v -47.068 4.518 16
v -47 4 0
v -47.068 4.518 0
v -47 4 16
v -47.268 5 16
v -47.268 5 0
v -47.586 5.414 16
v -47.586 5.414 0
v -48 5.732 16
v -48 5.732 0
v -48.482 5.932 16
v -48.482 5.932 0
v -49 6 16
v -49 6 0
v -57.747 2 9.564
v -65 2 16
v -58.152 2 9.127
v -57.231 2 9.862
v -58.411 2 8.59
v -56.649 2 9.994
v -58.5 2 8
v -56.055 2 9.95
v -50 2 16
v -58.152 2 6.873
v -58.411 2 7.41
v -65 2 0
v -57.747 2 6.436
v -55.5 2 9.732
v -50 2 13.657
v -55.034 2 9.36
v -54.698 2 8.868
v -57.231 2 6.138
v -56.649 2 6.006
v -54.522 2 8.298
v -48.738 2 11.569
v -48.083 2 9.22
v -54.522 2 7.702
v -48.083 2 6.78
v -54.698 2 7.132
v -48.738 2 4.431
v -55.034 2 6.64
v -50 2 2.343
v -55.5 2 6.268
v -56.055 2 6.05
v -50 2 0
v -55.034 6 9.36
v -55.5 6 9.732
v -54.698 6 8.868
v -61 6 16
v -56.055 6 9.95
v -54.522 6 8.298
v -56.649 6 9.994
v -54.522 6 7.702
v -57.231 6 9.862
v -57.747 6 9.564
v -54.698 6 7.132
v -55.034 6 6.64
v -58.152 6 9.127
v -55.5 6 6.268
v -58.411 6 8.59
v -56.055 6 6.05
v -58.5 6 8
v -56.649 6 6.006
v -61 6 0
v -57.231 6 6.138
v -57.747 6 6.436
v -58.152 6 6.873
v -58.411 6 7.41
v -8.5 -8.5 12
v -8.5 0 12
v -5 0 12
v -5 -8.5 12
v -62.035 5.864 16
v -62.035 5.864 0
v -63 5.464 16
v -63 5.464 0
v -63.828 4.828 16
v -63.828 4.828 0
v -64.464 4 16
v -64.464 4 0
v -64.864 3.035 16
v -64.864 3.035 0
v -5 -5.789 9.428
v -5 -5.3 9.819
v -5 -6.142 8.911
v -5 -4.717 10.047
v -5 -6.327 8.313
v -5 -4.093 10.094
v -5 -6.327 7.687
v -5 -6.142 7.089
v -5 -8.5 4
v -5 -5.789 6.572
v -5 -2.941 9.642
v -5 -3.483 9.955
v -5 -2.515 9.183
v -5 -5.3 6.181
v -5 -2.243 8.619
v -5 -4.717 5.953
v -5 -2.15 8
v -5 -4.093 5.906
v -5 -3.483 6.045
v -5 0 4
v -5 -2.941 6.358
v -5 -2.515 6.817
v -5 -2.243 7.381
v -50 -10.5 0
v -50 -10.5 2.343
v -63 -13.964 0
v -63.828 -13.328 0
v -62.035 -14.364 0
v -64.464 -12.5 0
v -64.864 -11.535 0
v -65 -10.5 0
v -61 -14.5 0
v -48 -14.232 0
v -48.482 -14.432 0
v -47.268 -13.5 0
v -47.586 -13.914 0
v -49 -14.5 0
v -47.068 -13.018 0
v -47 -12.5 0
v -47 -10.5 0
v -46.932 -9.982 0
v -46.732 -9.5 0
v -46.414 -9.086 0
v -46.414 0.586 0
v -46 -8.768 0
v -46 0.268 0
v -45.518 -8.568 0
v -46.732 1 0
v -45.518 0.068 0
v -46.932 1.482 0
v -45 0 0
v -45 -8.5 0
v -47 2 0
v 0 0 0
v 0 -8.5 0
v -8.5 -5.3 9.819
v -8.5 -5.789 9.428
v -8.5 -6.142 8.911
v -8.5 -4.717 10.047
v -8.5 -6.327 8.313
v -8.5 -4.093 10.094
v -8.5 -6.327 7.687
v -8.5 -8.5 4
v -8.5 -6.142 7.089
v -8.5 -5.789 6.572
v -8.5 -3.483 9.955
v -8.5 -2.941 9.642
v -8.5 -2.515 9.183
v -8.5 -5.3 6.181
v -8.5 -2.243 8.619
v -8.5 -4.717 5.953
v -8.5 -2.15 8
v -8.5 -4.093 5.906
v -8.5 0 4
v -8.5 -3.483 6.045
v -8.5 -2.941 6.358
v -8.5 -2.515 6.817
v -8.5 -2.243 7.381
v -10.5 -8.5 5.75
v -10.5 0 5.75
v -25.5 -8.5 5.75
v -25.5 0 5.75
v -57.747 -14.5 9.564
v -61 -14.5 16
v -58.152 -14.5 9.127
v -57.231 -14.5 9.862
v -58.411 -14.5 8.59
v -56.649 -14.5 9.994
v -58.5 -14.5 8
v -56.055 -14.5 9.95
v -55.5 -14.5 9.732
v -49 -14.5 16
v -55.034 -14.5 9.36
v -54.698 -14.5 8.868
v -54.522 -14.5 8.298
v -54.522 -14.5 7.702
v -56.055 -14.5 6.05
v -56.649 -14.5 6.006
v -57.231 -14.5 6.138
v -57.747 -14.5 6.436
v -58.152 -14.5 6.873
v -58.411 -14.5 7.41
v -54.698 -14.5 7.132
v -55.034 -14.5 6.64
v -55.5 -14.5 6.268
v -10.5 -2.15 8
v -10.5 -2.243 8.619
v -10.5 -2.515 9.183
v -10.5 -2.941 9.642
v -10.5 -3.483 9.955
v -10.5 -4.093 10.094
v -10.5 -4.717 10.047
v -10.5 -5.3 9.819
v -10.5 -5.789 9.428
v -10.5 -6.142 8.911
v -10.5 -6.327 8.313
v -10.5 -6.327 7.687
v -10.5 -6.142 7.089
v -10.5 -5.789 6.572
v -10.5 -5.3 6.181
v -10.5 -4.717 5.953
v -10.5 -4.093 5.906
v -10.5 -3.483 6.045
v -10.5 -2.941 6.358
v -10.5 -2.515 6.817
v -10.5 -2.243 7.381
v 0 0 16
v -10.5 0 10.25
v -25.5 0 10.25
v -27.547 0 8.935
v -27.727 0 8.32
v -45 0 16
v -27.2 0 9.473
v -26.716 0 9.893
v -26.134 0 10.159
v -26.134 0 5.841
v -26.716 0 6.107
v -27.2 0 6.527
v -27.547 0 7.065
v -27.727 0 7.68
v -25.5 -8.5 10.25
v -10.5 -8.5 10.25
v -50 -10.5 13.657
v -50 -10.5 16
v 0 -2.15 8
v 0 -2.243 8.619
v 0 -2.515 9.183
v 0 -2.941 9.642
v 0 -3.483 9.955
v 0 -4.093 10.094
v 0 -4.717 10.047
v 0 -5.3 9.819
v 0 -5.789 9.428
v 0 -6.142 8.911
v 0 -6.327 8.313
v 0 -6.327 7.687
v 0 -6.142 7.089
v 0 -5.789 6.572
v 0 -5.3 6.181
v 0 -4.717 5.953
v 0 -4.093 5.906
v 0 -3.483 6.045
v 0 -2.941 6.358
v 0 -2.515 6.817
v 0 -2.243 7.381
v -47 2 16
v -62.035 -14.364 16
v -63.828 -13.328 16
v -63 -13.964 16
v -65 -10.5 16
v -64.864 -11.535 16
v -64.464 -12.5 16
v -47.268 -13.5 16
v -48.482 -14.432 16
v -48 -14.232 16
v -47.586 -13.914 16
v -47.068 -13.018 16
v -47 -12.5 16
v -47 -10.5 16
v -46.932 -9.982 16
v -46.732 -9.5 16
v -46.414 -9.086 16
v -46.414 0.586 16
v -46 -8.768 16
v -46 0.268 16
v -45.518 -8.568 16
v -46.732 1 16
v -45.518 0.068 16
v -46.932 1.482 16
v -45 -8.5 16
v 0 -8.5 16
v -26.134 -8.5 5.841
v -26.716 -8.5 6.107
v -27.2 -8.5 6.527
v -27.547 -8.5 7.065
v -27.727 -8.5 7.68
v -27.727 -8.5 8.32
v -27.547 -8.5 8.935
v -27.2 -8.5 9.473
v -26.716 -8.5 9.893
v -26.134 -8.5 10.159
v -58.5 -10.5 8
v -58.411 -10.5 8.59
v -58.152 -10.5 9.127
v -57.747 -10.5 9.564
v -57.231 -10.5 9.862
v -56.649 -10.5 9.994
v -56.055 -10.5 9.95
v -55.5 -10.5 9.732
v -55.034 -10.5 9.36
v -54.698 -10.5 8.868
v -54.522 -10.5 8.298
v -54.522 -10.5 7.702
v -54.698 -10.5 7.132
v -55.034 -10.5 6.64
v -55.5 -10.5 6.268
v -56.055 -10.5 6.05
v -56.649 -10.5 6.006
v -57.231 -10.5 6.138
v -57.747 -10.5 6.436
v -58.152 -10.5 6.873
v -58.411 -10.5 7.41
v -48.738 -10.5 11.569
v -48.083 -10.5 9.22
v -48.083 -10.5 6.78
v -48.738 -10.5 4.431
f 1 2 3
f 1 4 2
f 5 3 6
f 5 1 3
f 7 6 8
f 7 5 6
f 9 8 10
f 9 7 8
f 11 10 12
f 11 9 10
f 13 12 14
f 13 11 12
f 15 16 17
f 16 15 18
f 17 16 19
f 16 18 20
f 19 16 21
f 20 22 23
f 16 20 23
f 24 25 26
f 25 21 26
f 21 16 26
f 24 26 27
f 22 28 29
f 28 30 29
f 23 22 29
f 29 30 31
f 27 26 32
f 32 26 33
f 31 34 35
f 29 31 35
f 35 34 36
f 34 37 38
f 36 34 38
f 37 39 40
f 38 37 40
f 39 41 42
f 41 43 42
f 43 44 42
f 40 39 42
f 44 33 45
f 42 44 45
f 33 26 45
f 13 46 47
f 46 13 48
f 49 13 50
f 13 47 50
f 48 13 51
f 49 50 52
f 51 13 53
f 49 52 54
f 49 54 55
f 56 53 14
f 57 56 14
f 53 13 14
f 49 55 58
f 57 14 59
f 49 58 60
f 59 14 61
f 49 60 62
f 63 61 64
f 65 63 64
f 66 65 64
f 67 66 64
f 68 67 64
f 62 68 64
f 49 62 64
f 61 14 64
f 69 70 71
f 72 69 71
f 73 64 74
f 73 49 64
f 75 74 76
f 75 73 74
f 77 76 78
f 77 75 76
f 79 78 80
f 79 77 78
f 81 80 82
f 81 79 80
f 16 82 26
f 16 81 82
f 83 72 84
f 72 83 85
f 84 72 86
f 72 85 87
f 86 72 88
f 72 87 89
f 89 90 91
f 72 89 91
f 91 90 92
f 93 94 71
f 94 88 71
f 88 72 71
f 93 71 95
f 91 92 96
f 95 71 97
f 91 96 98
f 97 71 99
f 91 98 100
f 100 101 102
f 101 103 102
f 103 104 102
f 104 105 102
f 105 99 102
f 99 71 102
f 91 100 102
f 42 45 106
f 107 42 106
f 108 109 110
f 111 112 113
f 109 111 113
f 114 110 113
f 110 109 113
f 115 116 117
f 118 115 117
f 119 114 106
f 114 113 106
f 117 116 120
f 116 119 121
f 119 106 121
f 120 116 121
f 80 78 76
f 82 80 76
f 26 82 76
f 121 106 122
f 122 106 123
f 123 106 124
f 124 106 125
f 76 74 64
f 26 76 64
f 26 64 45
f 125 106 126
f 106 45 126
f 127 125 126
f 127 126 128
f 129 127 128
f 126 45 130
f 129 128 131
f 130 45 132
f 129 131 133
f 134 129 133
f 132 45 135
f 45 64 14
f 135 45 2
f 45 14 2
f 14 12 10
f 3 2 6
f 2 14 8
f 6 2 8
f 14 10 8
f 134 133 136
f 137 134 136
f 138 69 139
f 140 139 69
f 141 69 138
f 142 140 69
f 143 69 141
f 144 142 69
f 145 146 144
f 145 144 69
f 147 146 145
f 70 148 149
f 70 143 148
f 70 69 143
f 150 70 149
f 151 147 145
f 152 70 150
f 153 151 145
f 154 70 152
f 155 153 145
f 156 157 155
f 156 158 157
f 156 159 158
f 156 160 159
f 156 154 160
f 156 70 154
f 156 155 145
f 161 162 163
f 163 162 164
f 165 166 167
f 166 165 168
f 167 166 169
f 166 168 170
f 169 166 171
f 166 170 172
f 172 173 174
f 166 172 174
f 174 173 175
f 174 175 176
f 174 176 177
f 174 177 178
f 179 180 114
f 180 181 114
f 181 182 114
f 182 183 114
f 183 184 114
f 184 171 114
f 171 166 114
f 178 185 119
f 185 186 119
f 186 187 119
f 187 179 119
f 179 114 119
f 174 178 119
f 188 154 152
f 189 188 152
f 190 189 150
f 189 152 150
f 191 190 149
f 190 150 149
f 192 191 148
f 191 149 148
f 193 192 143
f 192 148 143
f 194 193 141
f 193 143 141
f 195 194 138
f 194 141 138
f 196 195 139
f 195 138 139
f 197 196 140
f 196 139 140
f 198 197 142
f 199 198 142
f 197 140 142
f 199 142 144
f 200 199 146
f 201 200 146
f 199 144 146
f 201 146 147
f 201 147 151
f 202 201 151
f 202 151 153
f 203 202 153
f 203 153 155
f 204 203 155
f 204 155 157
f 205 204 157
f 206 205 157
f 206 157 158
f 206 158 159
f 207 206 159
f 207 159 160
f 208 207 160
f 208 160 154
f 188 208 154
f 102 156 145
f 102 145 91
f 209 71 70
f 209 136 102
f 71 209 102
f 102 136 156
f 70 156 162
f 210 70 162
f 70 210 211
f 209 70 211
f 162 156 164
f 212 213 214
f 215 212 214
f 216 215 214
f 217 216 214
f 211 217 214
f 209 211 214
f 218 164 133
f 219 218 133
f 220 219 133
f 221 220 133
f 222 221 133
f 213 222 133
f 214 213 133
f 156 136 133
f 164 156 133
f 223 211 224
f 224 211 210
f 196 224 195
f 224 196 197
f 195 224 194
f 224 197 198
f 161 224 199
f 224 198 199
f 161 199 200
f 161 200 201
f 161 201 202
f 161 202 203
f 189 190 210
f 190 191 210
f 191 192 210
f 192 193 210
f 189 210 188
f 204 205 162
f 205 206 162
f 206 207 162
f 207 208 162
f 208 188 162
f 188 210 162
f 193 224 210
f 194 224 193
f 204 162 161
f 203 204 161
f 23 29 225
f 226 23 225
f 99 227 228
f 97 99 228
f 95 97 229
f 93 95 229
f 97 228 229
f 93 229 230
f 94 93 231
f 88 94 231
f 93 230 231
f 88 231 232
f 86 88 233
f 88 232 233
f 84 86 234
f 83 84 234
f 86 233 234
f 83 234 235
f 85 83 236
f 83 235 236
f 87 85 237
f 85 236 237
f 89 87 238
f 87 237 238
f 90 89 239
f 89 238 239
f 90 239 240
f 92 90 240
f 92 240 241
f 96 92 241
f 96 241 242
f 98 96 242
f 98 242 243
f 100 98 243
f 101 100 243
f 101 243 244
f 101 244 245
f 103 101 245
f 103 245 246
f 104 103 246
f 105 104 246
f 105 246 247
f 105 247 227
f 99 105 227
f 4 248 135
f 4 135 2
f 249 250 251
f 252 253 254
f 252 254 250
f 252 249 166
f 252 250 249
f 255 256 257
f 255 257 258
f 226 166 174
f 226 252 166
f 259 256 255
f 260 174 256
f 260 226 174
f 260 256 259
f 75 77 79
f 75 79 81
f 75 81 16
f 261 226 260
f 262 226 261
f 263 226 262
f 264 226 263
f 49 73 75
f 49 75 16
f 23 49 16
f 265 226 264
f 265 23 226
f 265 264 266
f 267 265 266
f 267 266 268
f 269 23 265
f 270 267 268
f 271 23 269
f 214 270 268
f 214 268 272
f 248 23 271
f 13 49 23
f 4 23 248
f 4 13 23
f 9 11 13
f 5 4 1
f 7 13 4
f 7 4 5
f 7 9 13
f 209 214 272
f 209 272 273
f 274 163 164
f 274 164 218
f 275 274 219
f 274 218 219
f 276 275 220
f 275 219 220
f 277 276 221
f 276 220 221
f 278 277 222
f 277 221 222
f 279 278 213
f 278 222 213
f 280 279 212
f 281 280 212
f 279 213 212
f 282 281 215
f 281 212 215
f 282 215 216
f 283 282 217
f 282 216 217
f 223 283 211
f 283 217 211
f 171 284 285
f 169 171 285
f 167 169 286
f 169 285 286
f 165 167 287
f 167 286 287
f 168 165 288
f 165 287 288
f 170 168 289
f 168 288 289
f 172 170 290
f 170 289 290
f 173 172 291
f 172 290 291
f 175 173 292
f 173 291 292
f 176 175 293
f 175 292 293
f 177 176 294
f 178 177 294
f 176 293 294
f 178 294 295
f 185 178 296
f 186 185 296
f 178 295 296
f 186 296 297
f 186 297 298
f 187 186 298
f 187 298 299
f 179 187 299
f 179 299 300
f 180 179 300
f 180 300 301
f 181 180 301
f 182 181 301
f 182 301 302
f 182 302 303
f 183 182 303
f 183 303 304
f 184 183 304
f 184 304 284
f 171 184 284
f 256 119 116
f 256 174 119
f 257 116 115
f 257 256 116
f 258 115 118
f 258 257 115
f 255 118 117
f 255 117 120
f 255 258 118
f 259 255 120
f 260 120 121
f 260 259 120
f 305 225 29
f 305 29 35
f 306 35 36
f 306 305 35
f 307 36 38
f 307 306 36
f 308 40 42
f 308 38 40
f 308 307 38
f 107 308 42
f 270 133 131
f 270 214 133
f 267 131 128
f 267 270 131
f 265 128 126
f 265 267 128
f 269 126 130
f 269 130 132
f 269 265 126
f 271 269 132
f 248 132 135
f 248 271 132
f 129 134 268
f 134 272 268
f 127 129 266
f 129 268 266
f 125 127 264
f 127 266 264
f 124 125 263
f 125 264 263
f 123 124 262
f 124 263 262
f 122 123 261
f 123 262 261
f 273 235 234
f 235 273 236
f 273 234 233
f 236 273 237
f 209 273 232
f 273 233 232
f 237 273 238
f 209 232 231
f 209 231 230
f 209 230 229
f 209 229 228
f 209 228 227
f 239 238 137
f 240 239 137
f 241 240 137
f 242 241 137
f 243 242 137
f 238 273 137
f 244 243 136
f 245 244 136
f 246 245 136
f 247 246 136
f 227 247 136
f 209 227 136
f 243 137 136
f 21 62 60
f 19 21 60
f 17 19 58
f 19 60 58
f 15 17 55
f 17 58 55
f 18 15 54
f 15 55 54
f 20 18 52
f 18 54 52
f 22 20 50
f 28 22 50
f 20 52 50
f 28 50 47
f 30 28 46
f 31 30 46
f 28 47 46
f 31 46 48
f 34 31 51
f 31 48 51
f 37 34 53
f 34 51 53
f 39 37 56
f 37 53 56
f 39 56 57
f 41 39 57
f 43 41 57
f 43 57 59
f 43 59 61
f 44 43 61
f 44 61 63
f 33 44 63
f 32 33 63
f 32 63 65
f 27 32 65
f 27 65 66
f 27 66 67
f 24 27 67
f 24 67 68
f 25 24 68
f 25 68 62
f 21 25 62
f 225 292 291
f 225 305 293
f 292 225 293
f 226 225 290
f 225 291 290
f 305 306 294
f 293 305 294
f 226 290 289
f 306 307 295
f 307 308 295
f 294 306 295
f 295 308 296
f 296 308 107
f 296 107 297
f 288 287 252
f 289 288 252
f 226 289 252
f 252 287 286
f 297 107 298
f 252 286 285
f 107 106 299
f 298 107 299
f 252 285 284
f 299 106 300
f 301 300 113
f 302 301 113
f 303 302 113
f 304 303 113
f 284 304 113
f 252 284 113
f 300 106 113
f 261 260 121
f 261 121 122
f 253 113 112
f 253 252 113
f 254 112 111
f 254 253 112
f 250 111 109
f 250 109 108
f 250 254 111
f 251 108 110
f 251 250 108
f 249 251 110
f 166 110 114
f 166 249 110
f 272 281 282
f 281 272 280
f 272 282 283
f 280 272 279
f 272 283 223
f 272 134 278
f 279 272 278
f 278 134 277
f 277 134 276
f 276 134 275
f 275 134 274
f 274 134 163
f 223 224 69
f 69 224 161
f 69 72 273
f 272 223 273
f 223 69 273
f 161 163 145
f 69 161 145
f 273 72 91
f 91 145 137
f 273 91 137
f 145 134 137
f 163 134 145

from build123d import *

# Parameters (mm, degrees)
BOSS_EXTRUDE1_DEPTH = 16
SKETCH2_W           = 3.5
SKETCH2_H           = 8
CUT_EXTRUDE1_DEPTH  = 69.492700341
CUT_EXTRUDE2_REACH  = 70.493
SKETCH3_R           = 2.1
FILLET1_R           = 2
SKETCH4_R           = 9
CUT_EXTRUDE3_DEPTH  = 12.5
SKETCH5_R           = 2
CUT_EXTRUDE4_DEPTH  = 71.008928002
FILLET2_R           = 4


with BuildPart() as part:
    # Sketch1 → Boss-Extrude1 (new body)
    with BuildSketch(Plane.XY):
        Polygon((0, 0), (-47, 0), (-47, 6), (-65, 6), (-65, 2), (-50, 2), (-50, -10.5), (-65, -10.5), (-65, -14.5), (-47, -14.5), (-47, -8.5), (0, -8.5), align=None)
    extrude(amount=BOSS_EXTRUDE1_DEPTH)

    # Sketch2 → Cut-Extrude1 (cut, through all)
    with BuildSketch(Plane(origin=(0, 0, 0), x_dir=(1, 0, 0), z_dir=(0, 1, 0))):
        with Locations((-6.75, -8)):
            Rectangle(SKETCH2_W, SKETCH2_H)
        with BuildLine():
            Line((-25.5, -10.25), (-10.5, -10.25))
            Line((-10.5, -10.25), (-10.5, -5.75))
            Line((-10.5, -5.75), (-25.5, -5.75))
            ThreePointArc((-25.5, -5.75), (-27.750000403, -8), (-25.5, -10.25))
        make_face()
    extrude(amount=-CUT_EXTRUDE1_DEPTH, mode=Mode.SUBTRACT)

    # Cut-Extrude2: up to this face of the body (flat: up to its plane)
    cut_extrude2_end = Plane(part.part.faces().sort_by_distance((-10.5, -4.25, 8))[0])
    # Sketch3 → Cut-Extrude2 (cut, up to the picked face)
    with BuildSketch(Plane(origin=(0, 0, 0), x_dir=(0, 0, -1), z_dir=(1, 0, 0)), mode=Mode.PRIVATE) as cut_extrude2_sk1:
        with Locations(Location((-8, -4.25, 0), (0, 0, 90))):
            Circle(SKETCH3_R)
    cut_extrude2_tool1 = split(extrude(cut_extrude2_sk1.sketch, amount=-CUT_EXTRUDE2_REACH, mode=Mode.PRIVATE), bisect_by=cut_extrude2_end, keep=Keep.BOTH, mode=Mode.PRIVATE)
    add(cut_extrude2_tool1.solids().sort_by(Axis((0, -4.25, 8), (-1, 0, 0)))[0], mode=Mode.SUBTRACT)

    # Fillet1
    fillet1_edges = [part.edges().sort_by_distance(p)[0] for p in [
        (-47, -8.5, 8),
        (-47, -14.5, 8),
        (-47, 6, 8),
        (-47, 0, 8),
    ]]
    fillet(fillet1_edges, radius=FILLET1_R)

    # Sketch4 → Cut-Extrude3 (cut)
    with BuildSketch(Plane(origin=(0, -10.5, 0), x_dir=(1, 0, 0), z_dir=(0, 1, 0))):
        with Locations((-57, -8)):
            Circle(SKETCH4_R)
    extrude(amount=CUT_EXTRUDE3_DEPTH, mode=Mode.SUBTRACT)

    # Sketch5 → Cut-Extrude4 (cut, through all)
    with BuildSketch(Plane(origin=(0, 6, 0), x_dir=(1, 0, 0), z_dir=(0, 1, 0))):
        with Locations(Location((-56.5, -8, 0), (0, 0, 180))):
            Circle(SKETCH5_R)
    extrude(amount=-CUT_EXTRUDE4_DEPTH, mode=Mode.SUBTRACT)

    # Fillet2
    fillet2_edges = [part.edges().sort_by_distance(p)[0] for p in [
        (-65, -14.5, 8),
        (-65, 6, 8),
    ]]
    fillet(fillet2_edges, radius=FILLET2_R - 0.0001)  # a hair under: the kernel refuses the full size


solid = part.part
